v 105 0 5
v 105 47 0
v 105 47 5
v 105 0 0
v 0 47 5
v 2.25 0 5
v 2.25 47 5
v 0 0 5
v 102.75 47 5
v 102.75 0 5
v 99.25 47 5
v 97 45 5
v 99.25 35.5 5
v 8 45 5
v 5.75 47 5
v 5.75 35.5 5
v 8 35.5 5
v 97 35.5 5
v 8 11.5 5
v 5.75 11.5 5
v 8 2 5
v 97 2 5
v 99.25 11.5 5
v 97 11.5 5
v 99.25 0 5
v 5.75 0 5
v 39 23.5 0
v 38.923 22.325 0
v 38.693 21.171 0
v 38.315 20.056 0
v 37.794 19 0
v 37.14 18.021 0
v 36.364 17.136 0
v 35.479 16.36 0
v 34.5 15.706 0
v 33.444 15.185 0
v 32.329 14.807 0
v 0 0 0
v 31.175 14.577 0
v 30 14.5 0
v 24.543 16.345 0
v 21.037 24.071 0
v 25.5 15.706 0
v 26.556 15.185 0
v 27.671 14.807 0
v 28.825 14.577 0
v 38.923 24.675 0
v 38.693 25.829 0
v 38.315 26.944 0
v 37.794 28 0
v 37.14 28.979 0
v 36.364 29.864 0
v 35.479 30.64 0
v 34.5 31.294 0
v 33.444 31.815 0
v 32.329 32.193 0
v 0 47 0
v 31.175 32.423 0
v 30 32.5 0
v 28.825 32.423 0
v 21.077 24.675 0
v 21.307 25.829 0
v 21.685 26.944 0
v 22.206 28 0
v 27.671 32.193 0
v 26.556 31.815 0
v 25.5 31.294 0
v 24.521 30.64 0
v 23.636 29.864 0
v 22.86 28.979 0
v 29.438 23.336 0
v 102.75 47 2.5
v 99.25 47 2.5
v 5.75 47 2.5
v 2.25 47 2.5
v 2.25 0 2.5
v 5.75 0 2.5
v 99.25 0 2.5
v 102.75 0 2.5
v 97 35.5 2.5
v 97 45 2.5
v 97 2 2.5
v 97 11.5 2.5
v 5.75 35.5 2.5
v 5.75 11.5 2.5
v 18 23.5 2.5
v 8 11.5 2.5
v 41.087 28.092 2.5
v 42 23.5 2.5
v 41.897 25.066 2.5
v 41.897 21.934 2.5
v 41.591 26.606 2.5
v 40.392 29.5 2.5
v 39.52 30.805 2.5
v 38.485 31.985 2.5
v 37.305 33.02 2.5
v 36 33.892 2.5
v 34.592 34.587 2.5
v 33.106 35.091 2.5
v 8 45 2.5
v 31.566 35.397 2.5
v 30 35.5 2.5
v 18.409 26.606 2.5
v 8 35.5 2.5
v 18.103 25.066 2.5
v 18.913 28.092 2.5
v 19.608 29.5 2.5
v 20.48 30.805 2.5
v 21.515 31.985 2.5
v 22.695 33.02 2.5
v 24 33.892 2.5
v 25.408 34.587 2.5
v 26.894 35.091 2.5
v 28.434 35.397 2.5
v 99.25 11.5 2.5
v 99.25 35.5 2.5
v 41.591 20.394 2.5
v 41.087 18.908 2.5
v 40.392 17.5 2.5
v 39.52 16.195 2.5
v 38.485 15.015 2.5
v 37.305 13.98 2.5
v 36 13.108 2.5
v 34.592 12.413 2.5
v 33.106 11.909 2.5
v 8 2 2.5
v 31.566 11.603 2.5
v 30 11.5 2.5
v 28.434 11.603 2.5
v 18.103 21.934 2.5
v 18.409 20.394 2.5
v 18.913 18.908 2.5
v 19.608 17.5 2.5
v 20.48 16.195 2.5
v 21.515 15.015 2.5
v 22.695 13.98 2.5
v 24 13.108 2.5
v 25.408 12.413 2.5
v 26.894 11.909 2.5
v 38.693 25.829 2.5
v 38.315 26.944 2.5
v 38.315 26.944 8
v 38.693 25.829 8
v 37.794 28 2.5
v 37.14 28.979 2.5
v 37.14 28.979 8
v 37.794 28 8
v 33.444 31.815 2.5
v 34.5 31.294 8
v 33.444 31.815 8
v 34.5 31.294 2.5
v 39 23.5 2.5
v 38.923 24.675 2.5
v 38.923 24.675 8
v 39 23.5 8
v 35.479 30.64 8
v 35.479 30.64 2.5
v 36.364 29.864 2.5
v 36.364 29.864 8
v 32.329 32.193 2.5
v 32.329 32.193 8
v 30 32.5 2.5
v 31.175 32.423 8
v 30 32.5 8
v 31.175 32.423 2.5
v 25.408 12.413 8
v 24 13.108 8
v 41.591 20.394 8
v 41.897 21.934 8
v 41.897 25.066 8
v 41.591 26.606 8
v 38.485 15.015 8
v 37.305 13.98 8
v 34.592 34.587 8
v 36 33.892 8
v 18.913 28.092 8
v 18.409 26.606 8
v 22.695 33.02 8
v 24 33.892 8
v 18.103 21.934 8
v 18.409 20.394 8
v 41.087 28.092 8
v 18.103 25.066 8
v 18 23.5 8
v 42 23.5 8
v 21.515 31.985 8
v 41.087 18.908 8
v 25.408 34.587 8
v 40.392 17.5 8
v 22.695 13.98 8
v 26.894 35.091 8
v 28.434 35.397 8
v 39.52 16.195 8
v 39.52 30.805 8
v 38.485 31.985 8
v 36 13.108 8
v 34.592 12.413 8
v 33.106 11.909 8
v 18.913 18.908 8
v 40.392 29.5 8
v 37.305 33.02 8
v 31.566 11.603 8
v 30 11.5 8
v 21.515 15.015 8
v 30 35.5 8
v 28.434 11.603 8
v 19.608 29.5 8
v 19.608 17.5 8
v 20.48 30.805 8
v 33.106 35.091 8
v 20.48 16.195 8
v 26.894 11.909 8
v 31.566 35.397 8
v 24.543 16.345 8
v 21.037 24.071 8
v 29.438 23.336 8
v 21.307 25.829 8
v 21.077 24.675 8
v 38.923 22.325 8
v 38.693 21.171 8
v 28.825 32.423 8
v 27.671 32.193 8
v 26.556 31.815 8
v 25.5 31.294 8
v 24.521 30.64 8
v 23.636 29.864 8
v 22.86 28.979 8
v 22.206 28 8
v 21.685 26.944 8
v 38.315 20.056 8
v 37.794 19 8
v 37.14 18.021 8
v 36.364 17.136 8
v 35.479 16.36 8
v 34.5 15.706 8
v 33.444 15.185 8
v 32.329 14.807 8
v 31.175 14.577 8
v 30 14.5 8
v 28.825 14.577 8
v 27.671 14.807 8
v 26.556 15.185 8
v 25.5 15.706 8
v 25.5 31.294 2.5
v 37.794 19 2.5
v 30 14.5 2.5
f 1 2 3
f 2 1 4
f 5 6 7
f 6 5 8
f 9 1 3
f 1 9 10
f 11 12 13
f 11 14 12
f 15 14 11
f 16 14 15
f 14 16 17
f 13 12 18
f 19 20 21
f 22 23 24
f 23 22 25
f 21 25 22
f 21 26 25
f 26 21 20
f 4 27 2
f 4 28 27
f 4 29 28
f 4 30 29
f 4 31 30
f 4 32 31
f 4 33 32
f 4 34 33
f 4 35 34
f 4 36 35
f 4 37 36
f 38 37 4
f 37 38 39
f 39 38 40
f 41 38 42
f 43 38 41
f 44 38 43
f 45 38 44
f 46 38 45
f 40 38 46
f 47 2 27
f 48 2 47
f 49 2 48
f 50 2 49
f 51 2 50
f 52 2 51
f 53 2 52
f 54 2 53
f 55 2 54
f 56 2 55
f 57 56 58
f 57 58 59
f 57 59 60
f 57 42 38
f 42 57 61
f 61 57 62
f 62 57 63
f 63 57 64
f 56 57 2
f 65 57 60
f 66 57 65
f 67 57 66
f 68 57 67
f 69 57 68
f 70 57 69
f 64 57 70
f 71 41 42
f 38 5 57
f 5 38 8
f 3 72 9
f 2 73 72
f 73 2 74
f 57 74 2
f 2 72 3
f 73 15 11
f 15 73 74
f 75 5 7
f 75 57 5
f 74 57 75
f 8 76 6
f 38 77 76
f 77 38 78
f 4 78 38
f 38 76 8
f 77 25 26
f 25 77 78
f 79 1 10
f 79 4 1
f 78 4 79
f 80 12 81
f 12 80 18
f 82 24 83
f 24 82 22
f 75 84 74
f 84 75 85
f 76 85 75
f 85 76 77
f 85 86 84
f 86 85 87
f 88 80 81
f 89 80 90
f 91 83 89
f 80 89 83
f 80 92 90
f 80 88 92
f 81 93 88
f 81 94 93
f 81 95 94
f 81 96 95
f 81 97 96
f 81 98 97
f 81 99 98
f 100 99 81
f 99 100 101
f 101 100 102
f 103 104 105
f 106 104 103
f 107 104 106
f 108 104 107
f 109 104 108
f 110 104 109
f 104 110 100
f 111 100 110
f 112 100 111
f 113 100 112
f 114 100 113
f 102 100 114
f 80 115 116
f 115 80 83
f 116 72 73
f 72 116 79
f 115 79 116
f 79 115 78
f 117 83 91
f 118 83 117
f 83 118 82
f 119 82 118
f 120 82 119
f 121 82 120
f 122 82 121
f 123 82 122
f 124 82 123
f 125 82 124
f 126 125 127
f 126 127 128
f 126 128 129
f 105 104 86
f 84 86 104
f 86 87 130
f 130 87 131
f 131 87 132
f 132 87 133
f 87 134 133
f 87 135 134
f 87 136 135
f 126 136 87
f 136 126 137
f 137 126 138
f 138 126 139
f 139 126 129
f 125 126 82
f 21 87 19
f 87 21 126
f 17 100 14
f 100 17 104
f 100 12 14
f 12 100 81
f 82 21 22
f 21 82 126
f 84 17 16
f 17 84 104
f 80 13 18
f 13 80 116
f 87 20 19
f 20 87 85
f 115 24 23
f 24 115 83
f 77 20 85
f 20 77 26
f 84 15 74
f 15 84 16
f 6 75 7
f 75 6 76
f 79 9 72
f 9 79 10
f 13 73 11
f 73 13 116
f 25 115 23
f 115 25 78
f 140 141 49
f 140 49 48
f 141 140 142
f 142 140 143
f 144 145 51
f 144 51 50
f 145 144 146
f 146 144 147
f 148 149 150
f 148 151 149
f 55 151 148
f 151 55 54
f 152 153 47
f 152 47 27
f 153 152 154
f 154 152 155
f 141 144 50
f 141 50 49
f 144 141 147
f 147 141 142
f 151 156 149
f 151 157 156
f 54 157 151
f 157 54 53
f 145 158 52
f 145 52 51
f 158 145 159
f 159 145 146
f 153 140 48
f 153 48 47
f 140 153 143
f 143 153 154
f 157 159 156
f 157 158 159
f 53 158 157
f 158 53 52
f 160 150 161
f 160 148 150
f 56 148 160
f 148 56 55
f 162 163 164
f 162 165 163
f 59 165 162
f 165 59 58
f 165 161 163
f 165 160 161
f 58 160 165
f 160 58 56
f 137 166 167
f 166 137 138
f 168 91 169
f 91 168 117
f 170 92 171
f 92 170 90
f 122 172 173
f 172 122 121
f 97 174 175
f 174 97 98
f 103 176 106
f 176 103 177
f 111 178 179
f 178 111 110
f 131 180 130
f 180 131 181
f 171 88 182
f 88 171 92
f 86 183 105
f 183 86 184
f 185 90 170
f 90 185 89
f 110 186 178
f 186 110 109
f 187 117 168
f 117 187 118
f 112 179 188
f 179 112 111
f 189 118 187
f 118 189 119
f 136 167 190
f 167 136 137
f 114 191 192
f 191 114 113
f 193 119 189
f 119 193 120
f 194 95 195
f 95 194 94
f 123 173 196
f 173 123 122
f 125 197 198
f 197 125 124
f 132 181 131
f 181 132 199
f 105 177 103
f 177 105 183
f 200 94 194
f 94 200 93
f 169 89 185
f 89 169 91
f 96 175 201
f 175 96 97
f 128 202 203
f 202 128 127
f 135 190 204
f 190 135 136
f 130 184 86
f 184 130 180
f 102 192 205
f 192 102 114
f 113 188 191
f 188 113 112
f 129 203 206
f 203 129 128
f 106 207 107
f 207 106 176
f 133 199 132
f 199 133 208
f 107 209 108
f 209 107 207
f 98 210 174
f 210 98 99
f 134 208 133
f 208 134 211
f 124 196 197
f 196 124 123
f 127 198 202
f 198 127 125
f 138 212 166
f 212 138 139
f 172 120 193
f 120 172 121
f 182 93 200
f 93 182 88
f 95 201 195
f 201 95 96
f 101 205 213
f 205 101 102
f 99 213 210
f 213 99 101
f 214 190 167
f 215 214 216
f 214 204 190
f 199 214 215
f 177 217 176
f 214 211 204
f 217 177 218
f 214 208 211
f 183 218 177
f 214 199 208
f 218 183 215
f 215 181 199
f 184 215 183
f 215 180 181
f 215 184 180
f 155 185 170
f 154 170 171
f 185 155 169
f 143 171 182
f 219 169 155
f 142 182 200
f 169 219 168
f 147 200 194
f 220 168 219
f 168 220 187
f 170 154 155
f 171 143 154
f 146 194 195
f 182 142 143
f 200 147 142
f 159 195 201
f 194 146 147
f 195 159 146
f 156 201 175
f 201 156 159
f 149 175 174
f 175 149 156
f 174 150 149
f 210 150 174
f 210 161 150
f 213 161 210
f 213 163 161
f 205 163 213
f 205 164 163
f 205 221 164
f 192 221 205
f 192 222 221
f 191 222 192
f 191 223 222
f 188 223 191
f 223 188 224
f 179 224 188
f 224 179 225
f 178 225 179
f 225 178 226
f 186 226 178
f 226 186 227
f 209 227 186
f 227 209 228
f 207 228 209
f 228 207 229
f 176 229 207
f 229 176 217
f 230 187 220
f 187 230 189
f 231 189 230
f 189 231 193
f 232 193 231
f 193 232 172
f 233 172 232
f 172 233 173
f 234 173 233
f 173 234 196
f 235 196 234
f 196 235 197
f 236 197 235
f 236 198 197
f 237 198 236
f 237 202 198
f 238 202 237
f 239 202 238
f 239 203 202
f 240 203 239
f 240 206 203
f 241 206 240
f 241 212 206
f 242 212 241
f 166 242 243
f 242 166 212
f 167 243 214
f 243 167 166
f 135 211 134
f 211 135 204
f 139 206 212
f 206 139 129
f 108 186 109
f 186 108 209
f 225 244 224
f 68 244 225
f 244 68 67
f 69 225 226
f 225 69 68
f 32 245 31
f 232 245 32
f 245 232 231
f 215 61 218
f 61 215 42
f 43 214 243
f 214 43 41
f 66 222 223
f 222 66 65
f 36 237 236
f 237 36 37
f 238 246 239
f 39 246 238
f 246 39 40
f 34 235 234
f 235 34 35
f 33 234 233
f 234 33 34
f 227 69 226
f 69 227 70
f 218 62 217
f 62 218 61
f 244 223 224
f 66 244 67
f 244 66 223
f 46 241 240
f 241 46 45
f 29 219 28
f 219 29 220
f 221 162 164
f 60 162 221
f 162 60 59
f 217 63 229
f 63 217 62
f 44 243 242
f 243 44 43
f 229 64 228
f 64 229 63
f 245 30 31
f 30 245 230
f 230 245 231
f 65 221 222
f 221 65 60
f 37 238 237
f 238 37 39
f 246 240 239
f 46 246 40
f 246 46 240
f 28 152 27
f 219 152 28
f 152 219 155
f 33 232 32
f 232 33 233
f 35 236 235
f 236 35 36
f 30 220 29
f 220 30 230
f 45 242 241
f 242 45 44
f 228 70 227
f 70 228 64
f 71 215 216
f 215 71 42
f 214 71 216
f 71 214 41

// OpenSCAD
// file: Defines_v1.scad
/* spacing between the leds
 * usually around 12, can be forced
 * to 6-10 by bending strip
 */
space = 6;  

/* some space for the outermost leds
 * for better viewing angle
 */
margin = 10;

/* 15 leds (type 5050) with above spacing */
width = 15 * (5 + space) + 10 + 2 * margin;

/* box height, min. 42mm */
height = 47;

/* box depth, min 100mm for 4x3-keypad */
depth = 105;

/* max wall thickness */
thick=10;

/* grade of feet smoothness
 * below 10 looks bad
 * 10-16 is reasonable
 * above 16 takes much time to render
 */
grade = 12;

/* length of side stands 
 * should be enough to get box in right angle
 * should not exceed back of box
 */
stand = min(height + 20, depth - 40);

/* offset of usb plug from center */
usb_offs = 60;

/* calculated values */
bwidth = width + 14;
bheight = depth + 7;

/* size of led holes 
 * includes some margin for 5050 leds
 */
led = 5.75;

minimal = 1;
// main file
include <Defines_v1.scad>;

module Rechts() {
    union() {
        difference() {
            translate([depth / 2, height / 2, 2.5]) 
                cube([depth, height, 5], center = true);
            translate([depth / 2, height / 2, 4.5]) 
                cube([depth - 16, height - 4, 4], center = true);
            translate([depth / 2, height / 2, 4.5]) 
                cube([depth - 5, 24, 4], center = true);
            translate([4, height / 2, 4.5]) 
                cube([3.5, height + 0.1, 4], center = true);
            translate([depth - 4, height / 2, 4.5]) 
                cube([3.5, height + 0.1, 4], center = true);
            translate([30, height / 2, 4]) 
                cylinder(8.1, 9, 9, $fn=48, center = true);
        }
        translate([24, height / 2 - 2.7, 4]) rotate([0, 0, 25])
             cylinder(8, 6, 6, $fn = 3, center = true);
        translate([30, height / 2, 4]) 
            difference() {
                cylinder(8, 12, 12, $fn=48, center = true);
                cylinder(8.1, 9, 9, $fn=48, center = true);
            }            
    }
}

Rechts();
